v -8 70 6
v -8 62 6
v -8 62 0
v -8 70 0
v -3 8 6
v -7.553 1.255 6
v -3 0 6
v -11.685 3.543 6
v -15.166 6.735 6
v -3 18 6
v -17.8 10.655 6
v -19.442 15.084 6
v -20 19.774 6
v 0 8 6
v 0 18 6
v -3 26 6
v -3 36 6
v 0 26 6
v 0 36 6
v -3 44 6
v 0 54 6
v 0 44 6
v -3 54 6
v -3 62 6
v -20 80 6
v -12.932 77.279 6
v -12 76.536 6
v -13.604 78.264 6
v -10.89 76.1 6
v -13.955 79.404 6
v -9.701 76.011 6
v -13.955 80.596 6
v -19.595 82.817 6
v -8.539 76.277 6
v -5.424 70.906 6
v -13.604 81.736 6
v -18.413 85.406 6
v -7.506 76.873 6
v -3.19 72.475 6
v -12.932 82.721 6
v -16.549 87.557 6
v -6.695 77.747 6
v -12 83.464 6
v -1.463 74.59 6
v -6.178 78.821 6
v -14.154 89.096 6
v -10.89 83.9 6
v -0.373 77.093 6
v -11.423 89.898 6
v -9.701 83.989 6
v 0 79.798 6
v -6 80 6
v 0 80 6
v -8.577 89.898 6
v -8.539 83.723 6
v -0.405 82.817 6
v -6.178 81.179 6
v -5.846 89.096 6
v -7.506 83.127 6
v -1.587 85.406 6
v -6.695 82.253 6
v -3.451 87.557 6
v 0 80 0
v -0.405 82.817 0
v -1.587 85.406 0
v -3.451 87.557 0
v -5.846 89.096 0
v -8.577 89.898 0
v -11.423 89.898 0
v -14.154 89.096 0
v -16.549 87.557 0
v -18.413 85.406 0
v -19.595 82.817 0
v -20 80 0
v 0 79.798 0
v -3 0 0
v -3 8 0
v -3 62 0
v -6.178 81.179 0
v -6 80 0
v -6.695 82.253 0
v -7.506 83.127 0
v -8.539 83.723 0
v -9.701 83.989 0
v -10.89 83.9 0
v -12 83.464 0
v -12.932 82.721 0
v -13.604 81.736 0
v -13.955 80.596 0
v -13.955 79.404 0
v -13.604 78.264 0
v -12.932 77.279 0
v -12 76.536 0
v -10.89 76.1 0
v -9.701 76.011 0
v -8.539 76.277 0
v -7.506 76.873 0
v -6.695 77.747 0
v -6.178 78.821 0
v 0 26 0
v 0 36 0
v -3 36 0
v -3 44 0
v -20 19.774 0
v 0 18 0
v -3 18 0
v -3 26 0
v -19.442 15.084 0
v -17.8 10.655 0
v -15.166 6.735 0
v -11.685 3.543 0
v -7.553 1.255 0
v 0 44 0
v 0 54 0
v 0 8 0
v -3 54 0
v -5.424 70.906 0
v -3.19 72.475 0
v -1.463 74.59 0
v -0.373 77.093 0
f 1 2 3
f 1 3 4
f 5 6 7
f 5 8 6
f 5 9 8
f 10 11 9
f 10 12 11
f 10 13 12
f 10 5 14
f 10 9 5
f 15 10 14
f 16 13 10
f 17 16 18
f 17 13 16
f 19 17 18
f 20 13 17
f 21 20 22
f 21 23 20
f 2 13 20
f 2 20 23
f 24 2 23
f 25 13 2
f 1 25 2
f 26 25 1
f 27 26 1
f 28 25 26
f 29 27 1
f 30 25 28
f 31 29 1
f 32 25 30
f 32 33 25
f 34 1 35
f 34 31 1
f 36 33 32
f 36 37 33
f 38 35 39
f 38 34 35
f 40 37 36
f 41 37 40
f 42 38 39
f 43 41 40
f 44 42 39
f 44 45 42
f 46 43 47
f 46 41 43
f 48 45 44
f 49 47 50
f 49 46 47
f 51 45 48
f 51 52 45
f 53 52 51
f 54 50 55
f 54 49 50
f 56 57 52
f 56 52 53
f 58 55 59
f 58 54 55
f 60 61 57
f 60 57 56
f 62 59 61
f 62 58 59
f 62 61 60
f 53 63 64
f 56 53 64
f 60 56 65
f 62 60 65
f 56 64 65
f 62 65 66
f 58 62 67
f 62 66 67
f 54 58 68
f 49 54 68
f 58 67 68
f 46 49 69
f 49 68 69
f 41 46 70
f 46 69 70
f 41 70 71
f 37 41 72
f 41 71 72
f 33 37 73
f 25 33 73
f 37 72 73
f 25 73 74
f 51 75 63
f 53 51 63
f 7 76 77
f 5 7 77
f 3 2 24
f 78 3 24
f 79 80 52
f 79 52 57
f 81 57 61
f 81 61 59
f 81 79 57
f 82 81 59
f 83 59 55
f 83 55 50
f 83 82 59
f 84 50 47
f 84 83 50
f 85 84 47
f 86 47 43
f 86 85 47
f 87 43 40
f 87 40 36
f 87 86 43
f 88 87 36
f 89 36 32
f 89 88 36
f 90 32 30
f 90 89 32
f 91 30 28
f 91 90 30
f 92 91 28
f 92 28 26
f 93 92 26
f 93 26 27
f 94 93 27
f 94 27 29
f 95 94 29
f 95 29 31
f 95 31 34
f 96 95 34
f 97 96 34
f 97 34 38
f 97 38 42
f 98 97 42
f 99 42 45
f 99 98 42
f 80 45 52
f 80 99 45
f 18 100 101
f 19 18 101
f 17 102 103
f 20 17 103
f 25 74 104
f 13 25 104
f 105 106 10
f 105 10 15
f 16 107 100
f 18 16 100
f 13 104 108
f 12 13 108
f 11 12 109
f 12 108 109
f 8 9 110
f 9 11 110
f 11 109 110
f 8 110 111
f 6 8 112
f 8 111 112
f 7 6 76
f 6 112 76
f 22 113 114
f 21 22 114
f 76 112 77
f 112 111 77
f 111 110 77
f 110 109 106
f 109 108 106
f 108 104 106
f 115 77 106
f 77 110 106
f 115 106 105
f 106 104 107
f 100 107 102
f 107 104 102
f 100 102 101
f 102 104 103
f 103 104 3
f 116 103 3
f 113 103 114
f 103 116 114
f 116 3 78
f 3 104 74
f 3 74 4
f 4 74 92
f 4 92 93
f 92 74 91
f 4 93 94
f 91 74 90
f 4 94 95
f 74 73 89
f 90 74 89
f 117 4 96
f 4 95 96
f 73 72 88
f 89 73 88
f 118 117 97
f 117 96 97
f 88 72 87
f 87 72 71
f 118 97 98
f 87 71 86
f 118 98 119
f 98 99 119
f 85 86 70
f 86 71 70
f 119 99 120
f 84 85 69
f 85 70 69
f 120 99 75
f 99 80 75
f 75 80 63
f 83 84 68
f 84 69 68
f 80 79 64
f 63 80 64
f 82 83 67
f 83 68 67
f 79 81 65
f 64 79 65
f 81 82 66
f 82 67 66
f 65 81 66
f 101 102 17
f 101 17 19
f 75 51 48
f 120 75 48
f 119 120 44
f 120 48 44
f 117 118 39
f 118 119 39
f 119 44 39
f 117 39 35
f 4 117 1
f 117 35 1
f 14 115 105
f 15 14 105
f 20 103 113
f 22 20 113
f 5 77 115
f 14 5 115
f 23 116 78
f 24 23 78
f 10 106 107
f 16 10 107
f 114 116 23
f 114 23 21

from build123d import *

# Parameters (mm, degrees)
ESQUISSE1_R             = 4
ESQUISSE1_W             = 3
ESQUISSE1_H             = 10
BOSS_EXTRU_1_DEPTH      = 6
ENL_V_MAT_EXTRU_1_DEPTH = 6
CONG_1_R                = 10
CONG_2_R                = 20


with BuildPart() as part:
    # Esquisse1 → Boss.-Extru.1 (new body)
    # profile 1 of 4: a face of its own
    with BuildSketch(Plane.XY):
        Polygon((-3, 44), (-3, 54), (-3, 62), (0, 62), (0, 90), (-20, 90), (-20, 0), (-3, 0), (-3, 8), (-3, 18), (-3, 26), (-3, 36), align=None)
        with Locations((-10, 80)):
            Circle(ESQUISSE1_R, mode=Mode.SUBTRACT)
    # profile 2 of 4: a face of its own
    with BuildSketch(Plane.XY):
        with Locations((-1.5, 49)):
            Rectangle(ESQUISSE1_W, ESQUISSE1_H)
    # profile 3 of 4: a face of its own
    with BuildSketch(Plane.XY):
        with Locations((-1.5, 31)):
            Rectangle(ESQUISSE1_W, ESQUISSE1_H)
    # profile 4 of 4: a face of its own
    with BuildSketch(Plane.XY):
        with Locations((-1.5, 13)):
            Rectangle(ESQUISSE1_W, ESQUISSE1_H)
    extrude(amount=BOSS_EXTRU_1_DEPTH)

    # Esquisse2 → Enlèv. mat.-Extru.1 (cut)
    with BuildSketch(Plane.XY.offset(6)):
        Polygon((-3, 62), (-8, 62), (-8, 70), (0, 70), (0, 62), align=None)
    extrude(amount=-ENL_V_MAT_EXTRU_1_DEPTH, mode=Mode.SUBTRACT)

    # Congé1
    # the kernel refuses this fillet: 10 mm, written as the material it takes off along each edge
    with BuildSketch(Plane(origin=(-20, 90, -25), x_dir=(0, -1, 0), z_dir=(0, 0, 1)), Plane(origin=(0, 90, -25), x_dir=(-1, 0, 0), z_dir=(0, 0, 1))) as cong_1_piece_1:
        with BuildLine():
            CenterArc((CONG_1_R, CONG_1_R), CONG_1_R, 180, 90)
            Line((0, CONG_1_R), (-CONG_1_R * 0.02, CONG_1_R))
            Line((-CONG_1_R * 0.02, CONG_1_R), (-CONG_1_R * 0.02, -CONG_1_R * 0.02))
            Line((-CONG_1_R * 0.02, -CONG_1_R * 0.02), (CONG_1_R, -CONG_1_R * 0.02))
            Line((CONG_1_R, -CONG_1_R * 0.02), (CONG_1_R, 0))
        make_face()
    extrude(amount=56, mode=Mode.SUBTRACT)
    with BuildSketch(Plane(origin=(0, 70, 30.494897428), x_dir=(0, 1, 0), z_dir=(0, 0, -1))) as cong_1_piece_2:
        with BuildLine():
            CenterArc((9.797958971, -10), CONG_1_R, 90, 78.463040967)
            Line((0, -8), (-0.195959179, -7.96))
            ThreePointArc((-0.195959179, -7.96), (-0.2, -4), (-0.2, 0))
            Line((-0.2, 0), (0, 0.2))
            Line((0, 0.2), (9.797958971, 0.2))
            Line((9.797958971, 0.2), (9.797958971, 0))
        make_face()
    extrude(amount=54.989794856, mode=Mode.SUBTRACT)

    # Congé2
    # the kernel refuses this fillet: 20 mm, written as the material it takes off along each edge
    with BuildSketch(Plane(origin=(-20, 0, -49.434299833), x_dir=(1, 0, 0), z_dir=(0, 0, 1))) as cong_2_piece_1:
        with BuildLine():
            CenterArc((20, 19.773719933), CONG_2_R, 180, 81.373073441)
            Line((0, 19.773719933), (-0.4, 19.773719933))
            Line((-0.4, 19.773719933), (-0.4, 0))
            Line((-0.4, 0), (0, -0.4))
            ThreePointArc((0, -0.4), (8.5, -0.4), (16.94, -0.395474399))
            Line((16.94, -0.395474399), (17, 0))
        make_face()
    extrude(amount=104.868599666, mode=Mode.SUBTRACT)


solid = part.part
